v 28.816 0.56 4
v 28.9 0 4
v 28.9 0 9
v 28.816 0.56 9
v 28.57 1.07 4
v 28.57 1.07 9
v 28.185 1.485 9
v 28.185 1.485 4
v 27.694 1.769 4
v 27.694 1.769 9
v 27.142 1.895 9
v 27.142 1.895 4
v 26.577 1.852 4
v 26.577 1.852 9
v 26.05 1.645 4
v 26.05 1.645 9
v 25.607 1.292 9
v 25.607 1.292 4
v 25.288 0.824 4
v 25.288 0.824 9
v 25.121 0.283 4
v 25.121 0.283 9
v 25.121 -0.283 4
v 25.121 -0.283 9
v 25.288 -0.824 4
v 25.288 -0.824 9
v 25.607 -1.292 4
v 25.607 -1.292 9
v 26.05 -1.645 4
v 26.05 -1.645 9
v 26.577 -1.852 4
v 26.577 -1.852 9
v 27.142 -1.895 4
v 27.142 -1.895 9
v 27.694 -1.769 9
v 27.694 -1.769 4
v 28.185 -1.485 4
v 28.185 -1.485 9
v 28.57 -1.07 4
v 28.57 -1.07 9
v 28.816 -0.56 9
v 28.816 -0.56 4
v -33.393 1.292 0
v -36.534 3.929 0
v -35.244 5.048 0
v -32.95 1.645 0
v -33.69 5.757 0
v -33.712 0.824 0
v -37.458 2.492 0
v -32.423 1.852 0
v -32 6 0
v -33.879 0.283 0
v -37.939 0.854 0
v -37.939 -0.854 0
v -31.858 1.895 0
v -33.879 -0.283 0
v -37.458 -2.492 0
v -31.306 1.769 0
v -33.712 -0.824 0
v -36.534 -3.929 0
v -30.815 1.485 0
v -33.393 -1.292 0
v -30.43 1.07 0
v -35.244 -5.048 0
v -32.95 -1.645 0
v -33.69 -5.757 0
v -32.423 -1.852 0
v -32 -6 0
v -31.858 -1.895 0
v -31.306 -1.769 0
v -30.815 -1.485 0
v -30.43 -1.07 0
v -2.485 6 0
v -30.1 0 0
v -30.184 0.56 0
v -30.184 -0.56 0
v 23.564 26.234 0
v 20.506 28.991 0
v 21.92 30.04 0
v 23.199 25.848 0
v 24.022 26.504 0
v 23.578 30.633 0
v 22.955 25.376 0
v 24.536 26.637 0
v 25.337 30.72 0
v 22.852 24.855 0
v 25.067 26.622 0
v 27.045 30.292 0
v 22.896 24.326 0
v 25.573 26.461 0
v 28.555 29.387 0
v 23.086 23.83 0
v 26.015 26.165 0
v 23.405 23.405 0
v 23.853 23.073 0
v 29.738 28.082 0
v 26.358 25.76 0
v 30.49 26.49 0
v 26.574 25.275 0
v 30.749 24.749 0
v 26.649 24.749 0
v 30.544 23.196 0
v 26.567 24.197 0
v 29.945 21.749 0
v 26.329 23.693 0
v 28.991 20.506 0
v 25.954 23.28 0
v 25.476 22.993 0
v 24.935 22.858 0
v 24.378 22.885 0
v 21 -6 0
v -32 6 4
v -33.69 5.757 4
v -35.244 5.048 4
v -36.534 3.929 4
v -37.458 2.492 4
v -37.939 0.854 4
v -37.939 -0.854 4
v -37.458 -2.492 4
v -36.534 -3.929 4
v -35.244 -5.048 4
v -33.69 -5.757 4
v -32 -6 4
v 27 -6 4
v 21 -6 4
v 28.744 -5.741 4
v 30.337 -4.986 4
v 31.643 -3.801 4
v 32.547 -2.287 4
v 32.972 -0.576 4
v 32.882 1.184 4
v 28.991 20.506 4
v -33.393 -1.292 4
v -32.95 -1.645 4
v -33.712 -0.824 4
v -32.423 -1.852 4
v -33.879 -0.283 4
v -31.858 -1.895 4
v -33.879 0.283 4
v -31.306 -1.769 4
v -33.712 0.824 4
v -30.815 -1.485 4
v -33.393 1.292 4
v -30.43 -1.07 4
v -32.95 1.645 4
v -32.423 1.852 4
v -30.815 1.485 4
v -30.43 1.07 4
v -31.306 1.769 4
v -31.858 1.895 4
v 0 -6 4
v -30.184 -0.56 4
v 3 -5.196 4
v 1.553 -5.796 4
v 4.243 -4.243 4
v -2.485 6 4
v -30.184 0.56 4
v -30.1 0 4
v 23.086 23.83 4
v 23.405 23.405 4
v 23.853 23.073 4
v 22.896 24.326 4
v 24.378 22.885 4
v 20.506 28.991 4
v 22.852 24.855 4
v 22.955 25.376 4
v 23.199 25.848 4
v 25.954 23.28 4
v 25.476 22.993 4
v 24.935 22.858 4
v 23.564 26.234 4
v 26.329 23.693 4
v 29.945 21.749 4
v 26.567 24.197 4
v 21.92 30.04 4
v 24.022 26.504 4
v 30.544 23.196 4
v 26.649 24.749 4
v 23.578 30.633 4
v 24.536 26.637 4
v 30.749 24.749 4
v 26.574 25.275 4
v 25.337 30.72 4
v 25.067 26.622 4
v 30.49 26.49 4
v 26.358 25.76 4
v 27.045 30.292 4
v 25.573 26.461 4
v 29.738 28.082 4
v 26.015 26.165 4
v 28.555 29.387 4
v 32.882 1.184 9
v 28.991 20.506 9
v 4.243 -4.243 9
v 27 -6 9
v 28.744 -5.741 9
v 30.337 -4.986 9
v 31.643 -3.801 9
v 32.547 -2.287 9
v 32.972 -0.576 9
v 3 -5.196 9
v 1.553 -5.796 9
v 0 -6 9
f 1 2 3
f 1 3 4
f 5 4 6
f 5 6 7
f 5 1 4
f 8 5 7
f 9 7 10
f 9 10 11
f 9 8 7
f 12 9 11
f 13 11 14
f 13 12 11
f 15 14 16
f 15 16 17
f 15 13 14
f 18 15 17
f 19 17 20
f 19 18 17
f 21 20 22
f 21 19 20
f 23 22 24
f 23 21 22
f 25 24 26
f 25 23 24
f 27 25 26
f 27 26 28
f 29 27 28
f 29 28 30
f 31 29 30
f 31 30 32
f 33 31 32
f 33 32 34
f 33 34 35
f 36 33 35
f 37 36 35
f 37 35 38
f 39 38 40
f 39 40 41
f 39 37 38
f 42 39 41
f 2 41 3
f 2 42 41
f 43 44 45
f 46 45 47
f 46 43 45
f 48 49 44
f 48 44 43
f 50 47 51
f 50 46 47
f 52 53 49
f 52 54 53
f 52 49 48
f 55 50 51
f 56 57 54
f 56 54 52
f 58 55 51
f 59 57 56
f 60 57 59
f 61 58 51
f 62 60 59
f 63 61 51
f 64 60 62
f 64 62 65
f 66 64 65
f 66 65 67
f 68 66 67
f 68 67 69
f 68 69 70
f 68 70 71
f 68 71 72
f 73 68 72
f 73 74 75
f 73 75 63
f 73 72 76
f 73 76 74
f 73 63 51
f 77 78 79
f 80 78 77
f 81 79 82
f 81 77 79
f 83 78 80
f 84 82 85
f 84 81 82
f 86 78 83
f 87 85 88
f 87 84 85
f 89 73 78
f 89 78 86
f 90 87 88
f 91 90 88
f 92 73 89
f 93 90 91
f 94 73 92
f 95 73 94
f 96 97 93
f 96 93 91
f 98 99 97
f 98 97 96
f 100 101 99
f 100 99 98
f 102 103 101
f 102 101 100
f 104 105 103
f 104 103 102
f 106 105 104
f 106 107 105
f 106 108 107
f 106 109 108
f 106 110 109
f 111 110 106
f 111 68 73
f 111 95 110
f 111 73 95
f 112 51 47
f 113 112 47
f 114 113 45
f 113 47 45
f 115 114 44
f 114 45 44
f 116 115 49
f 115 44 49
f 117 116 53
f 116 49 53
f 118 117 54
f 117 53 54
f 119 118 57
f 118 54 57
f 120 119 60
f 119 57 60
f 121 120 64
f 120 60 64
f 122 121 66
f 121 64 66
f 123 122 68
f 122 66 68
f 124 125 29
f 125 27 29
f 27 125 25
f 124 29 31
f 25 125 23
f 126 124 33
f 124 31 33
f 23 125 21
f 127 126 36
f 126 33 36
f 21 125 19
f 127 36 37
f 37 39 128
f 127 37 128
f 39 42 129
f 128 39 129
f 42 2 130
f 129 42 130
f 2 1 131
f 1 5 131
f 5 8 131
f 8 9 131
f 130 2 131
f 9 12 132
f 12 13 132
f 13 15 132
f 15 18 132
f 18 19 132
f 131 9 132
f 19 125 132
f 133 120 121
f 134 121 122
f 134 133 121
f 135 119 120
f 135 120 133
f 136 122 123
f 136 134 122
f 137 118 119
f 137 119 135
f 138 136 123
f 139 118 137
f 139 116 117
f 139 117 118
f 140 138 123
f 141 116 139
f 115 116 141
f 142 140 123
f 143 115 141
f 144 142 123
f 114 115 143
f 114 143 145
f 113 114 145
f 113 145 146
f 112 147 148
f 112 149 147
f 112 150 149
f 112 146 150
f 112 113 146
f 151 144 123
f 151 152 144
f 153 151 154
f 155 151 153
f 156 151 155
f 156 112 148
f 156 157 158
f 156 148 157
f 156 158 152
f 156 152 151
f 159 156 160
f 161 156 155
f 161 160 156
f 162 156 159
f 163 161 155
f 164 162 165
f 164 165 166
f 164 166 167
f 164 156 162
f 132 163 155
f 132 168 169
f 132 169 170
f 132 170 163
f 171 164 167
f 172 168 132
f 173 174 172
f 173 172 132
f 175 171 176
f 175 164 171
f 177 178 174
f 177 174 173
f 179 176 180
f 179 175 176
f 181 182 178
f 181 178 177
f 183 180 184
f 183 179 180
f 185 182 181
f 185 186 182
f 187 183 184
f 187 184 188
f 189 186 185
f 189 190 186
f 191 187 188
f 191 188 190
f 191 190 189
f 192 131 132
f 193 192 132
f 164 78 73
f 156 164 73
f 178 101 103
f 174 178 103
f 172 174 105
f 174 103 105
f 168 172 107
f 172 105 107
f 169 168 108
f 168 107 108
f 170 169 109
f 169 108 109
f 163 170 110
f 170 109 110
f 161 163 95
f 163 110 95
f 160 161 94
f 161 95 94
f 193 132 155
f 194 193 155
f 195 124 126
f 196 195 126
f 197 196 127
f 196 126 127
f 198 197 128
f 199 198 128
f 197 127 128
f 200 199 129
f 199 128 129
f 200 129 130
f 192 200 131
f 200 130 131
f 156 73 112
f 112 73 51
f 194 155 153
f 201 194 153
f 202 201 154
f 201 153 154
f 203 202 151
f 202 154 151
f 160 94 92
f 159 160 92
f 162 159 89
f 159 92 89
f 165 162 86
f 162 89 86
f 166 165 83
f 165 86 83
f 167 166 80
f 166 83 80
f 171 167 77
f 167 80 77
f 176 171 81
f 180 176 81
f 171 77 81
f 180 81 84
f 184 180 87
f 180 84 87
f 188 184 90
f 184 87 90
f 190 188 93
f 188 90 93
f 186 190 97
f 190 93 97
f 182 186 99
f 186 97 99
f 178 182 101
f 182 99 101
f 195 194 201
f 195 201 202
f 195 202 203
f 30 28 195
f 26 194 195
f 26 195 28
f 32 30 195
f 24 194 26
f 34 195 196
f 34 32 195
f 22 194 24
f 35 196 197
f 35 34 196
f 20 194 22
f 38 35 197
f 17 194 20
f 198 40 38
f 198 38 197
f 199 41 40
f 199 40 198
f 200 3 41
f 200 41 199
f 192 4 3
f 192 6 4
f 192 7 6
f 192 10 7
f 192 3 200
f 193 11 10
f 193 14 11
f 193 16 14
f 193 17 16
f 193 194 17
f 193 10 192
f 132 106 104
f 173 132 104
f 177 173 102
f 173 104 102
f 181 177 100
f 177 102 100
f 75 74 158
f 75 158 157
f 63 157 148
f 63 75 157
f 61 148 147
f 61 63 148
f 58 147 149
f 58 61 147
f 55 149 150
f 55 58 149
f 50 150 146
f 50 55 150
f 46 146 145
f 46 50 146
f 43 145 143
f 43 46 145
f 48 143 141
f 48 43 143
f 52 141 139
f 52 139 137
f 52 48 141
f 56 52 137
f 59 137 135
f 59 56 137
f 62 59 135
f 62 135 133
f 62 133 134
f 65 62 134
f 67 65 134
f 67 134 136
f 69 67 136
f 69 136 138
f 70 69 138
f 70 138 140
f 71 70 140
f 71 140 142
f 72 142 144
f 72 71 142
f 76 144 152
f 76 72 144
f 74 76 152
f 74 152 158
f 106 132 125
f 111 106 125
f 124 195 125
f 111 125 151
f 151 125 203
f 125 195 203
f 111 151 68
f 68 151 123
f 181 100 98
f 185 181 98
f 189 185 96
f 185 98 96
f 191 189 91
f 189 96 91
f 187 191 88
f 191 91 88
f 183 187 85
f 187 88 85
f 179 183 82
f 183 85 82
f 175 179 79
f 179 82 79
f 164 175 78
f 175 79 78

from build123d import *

# Parameters (mm, degrees)
F0_R     = 1.9
F1_DEPTH = 4
F2_R     = 1.9
F3_DEPTH = 5
F5_DEPTH = 4


with BuildPart() as f1:
    # F0 (on Top) → F1 (new body)
    with BuildSketch(Plane.XY):
        with BuildLine():
            Line((20.5060966544, 20.5060966544), (0, 0))
            Line((0, 0), (-26, 0))
            ThreePointArc((-26, 0), (-27.7573593129, -4.2426406871), (-32, -6))
            Line((-32, -6), (0, -6))
            ThreePointArc((0, -6), (2.2961005942, -5.5432771951), (4.2426406871, -4.2426406871))
            Line((4.2426406871, -4.2426406871), (28.9913780286, 20.5060966544))
            ThreePointArc((28.9913780286, 20.5060966544), (24.7487373415, 18.7487373415), (20.5060966544, 20.5060966544))
        make_face()
        with BuildLine():
            Line((-26, 0), (0, 0))
            Line((0, 0), (20.5060966544, 20.5060966544))
            ThreePointArc((20.5060966544, 20.5060966544), (18.7487373415, 24.7487373415), (20.5060966544, 28.9913780286))
            Line((20.5060966544, 28.9913780286), (-2.4852813742, 6))
            Line((-2.4852813742, 6), (-32, 6))
            ThreePointArc((-32, 6), (-27.7573593129, 4.2426406871), (-26, 0))
        make_face()
        with BuildLine():
            ThreePointArc((-32, -6), (-27.7573593129, -4.2426406871), (-26, 0))
            ThreePointArc((-26, 0), (-27.7573593129, 4.2426406871), (-32, 6))
            ThreePointArc((-32, 6), (-38, 0), (-32, -6))
        make_face()
        with Locations((-32, 0)):
            Circle(F0_R, mode=Mode.SUBTRACT)
        with BuildLine():
            ThreePointArc((20.5060966544, 28.9913780286), (18.7487373415, 24.7487373415), (20.5060966544, 20.5060966544))
            ThreePointArc((20.5060966544, 20.5060966544), (24.7487373415, 18.7487373415), (28.9913780286, 20.5060966544))
            ThreePointArc((28.9913780286, 20.5060966544), (30.2920145366, 22.4526367473), (30.7487373415, 24.7487373415))
            ThreePointArc((30.7487373415, 24.7487373415), (27.0448379357, 30.2920145366), (20.5060966544, 28.9913780286))
        make_face()
        with BuildLine():
            ThreePointArc((26.6487373415, 24.7487373415), (25.475835863, 22.9933662298), (23.4052344573, 23.4052344573))
            ThreePointArc((23.4052344573, 23.4052344573), (24.02163882, 26.5041084533), (26.6487373415, 24.7487373415))
        make_face(mode=Mode.SUBTRACT)
    extrude(amount=F1_DEPTH)

    # F2 (on face) → F3 (join)
    with BuildSketch(Plane.XY.offset(4)):
        with BuildLine():
            Line((28.9913780286, 20.5060966544), (4.2426406871, -4.2426406871))
            ThreePointArc((4.2426406871, -4.2426406871), (2.2961005942, -5.5432771951), (0, -6))
            Line((0, -6), (27, -6))
            ThreePointArc((27, -6), (31.6425330327, -3.8009060814), (32.8819440125, 1.1843709867))
            Line((32.8819440125, 1.1843709867), (28.9913780286, 20.5060966544))
        make_face()
        with Locations((27, 0)):
            Circle(F2_R, mode=Mode.SUBTRACT)
    extrude(amount=F3_DEPTH)

    # F4 (on face) → F5 (join)
    with BuildSketch(Plane(origin=(0, 0, 4), x_dir=(1, 0, 0), z_dir=(0, 0, -1))):
        with BuildLine():
            ThreePointArc((0, 6), (2.2961005942, 5.5432771951), (4.2426406871, 4.2426406871))
            Line((4.2426406871, 4.2426406871), (28.9913780286, -20.5060966544))
            Line((28.9913780286, -20.5060966544), (21, 6))
            Line((21, 6), (0, 6))
        make_face()
    extrude(amount=F5_DEPTH)


solid = f1.part
